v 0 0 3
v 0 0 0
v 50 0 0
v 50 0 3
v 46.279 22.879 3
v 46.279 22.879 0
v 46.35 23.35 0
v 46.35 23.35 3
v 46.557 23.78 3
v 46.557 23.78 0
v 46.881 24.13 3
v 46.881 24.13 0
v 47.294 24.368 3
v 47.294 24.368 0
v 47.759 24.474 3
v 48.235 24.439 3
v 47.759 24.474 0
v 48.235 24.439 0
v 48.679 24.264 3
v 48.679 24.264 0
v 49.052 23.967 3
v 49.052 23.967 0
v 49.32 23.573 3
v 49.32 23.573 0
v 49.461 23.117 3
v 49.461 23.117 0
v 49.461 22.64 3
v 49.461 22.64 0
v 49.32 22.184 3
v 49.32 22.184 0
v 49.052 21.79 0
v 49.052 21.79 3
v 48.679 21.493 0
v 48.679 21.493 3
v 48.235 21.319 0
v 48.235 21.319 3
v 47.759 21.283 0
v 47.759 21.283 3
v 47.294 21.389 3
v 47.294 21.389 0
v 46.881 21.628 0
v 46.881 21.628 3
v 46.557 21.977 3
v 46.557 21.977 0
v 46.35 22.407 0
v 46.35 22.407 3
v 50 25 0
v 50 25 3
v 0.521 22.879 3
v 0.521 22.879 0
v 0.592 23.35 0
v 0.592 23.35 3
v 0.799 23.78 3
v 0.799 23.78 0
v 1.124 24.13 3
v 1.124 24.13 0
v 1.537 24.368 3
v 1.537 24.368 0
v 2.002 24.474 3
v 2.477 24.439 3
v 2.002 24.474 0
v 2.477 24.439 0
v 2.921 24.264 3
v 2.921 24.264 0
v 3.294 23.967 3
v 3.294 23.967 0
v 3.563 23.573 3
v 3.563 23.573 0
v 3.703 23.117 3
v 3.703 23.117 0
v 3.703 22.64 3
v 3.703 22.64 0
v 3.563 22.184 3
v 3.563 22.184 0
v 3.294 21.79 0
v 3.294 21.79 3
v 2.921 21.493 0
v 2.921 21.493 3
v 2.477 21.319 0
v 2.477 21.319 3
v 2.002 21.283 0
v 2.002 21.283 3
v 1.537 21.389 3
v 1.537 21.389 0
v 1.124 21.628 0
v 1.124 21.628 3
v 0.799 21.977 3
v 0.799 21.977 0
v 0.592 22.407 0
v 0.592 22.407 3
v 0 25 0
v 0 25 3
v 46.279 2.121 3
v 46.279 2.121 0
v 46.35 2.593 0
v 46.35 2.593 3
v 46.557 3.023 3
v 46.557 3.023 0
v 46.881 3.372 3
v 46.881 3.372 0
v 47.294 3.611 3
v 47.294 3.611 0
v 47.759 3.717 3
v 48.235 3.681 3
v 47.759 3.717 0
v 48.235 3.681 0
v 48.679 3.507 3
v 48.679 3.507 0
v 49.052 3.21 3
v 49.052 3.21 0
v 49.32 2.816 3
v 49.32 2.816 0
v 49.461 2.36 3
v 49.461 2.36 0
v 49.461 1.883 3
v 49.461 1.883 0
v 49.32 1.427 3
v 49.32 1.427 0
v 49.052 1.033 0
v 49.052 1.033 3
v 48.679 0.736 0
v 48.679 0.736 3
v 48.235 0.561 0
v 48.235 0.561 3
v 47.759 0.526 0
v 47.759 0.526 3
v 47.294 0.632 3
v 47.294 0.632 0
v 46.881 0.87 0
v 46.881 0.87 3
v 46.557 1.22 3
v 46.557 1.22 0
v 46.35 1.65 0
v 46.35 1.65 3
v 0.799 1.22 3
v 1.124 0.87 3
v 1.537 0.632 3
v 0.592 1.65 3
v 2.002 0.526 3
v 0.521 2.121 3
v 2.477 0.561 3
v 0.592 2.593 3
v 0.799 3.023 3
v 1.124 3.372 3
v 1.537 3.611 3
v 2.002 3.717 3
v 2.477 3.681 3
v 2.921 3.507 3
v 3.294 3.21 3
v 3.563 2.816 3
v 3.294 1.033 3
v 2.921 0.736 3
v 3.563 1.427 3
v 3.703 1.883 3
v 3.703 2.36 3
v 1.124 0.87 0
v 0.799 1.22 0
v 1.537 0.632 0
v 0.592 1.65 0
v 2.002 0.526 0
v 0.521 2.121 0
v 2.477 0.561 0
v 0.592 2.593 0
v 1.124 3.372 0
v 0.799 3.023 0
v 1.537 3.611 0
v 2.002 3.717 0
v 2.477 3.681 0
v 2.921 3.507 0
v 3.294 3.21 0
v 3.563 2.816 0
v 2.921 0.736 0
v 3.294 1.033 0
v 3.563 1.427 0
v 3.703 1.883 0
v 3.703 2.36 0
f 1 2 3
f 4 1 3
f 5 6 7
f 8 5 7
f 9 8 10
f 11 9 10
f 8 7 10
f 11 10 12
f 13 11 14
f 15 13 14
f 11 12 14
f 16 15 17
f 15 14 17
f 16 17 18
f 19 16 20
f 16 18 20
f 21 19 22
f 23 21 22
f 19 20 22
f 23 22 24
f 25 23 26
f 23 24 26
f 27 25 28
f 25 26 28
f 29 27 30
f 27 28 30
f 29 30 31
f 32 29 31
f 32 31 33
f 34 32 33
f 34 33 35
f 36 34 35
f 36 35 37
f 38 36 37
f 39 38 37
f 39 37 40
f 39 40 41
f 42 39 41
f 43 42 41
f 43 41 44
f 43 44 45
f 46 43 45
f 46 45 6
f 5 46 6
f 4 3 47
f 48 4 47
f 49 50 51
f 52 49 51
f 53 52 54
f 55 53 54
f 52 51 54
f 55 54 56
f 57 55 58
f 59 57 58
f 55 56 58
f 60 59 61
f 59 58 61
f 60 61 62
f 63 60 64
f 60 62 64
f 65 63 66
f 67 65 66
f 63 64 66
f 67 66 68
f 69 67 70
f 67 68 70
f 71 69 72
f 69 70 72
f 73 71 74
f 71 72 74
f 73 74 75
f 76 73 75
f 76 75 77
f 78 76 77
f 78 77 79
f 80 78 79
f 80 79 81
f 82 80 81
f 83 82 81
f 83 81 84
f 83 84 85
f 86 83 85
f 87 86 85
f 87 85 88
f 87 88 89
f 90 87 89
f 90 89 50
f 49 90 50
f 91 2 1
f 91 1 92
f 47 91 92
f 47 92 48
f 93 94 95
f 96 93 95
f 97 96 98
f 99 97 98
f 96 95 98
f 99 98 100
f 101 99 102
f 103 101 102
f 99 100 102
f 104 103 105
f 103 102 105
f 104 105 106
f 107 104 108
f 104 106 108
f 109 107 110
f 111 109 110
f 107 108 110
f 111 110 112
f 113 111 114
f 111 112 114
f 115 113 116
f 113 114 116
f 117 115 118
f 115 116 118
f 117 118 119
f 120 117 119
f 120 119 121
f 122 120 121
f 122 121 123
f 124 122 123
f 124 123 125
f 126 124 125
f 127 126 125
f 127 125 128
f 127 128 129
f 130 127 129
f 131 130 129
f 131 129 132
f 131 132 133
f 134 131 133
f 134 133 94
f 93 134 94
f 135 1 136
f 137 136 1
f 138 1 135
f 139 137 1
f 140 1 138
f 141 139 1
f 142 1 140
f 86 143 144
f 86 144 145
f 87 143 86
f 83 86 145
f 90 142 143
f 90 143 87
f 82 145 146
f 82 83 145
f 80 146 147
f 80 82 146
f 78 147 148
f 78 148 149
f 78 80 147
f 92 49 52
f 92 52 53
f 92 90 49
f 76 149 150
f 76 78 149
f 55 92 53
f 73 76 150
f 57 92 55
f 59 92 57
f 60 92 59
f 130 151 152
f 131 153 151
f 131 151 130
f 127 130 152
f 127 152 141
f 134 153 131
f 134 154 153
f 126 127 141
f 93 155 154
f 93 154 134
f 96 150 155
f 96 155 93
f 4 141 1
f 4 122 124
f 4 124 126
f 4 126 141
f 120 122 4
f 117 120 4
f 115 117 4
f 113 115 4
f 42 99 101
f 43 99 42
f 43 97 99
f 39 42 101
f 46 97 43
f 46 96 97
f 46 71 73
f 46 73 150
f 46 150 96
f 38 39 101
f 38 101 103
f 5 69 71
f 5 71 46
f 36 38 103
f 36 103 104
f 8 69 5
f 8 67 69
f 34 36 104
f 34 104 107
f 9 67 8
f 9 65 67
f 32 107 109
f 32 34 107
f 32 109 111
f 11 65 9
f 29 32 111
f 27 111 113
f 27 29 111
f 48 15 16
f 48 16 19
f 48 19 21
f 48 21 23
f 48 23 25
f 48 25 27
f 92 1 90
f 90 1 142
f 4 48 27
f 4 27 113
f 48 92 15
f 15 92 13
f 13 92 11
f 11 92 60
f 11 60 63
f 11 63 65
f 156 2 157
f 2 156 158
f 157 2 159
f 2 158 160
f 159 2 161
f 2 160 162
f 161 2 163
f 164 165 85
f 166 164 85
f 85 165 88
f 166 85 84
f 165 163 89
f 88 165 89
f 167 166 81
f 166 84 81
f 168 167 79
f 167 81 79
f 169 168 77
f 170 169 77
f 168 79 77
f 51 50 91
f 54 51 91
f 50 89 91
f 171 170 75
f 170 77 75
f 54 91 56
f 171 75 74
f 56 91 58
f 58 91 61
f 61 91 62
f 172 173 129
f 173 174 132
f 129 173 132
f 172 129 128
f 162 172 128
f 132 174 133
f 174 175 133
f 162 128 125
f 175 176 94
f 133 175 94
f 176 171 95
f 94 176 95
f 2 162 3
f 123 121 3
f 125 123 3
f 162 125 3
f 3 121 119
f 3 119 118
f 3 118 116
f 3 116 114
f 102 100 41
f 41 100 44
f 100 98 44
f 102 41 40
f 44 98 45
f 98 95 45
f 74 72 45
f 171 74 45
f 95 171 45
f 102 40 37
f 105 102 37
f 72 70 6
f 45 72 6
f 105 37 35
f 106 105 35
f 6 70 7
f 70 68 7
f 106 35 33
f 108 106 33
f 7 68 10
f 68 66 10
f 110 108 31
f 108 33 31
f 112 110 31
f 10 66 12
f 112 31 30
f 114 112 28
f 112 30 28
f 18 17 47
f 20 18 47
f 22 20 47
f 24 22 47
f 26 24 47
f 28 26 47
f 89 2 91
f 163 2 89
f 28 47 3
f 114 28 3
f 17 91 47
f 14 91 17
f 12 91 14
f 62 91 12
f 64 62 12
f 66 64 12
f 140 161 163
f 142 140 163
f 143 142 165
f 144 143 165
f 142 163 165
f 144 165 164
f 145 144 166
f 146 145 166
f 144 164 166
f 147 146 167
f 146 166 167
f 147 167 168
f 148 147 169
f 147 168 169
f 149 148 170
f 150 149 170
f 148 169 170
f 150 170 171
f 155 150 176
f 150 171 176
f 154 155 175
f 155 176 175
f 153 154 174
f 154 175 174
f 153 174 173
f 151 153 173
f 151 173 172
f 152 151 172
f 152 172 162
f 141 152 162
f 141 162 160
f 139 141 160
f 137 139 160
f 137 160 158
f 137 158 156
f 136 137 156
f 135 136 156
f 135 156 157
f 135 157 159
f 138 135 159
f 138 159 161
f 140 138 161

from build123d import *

# Parameters (mm, degrees)
F0_W     = 50
F0_H     = 25
F1_DEPTH = 3
F3_D     = 3.2
F4_D     = 3.2
F5_D     = 3.2
F6_D     = 3.2


with BuildPart() as f1:
    # F0 (on Top) → F1 (new body)
    with BuildSketch(Plane.XY):
        with Locations((25, 12.5)):
            Rectangle(F0_W, F0_H)
    extrude(amount=F1_DEPTH)

    # F3 (through all)
    with Locations(Plane.XY.offset(3)):
        with Locations((2.12132, 22.87868)):
            Hole(F3_D / 2)

    # F4 (through all)
    with Locations(Plane.XY.offset(3)):
        with Locations((2.12132, 2.12132)):
            Hole(F4_D / 2)

    # F5 (through all)
    with Locations(Plane.XY.offset(3)):
        with Locations((47.87868, 2.12132)):
            Hole(F5_D / 2)

    # F6 (through all)
    with Locations(Plane.XY.offset(3)):
        with Locations((47.87868, 22.87868)):
            Hole(F6_D / 2)


solid = f1.part
